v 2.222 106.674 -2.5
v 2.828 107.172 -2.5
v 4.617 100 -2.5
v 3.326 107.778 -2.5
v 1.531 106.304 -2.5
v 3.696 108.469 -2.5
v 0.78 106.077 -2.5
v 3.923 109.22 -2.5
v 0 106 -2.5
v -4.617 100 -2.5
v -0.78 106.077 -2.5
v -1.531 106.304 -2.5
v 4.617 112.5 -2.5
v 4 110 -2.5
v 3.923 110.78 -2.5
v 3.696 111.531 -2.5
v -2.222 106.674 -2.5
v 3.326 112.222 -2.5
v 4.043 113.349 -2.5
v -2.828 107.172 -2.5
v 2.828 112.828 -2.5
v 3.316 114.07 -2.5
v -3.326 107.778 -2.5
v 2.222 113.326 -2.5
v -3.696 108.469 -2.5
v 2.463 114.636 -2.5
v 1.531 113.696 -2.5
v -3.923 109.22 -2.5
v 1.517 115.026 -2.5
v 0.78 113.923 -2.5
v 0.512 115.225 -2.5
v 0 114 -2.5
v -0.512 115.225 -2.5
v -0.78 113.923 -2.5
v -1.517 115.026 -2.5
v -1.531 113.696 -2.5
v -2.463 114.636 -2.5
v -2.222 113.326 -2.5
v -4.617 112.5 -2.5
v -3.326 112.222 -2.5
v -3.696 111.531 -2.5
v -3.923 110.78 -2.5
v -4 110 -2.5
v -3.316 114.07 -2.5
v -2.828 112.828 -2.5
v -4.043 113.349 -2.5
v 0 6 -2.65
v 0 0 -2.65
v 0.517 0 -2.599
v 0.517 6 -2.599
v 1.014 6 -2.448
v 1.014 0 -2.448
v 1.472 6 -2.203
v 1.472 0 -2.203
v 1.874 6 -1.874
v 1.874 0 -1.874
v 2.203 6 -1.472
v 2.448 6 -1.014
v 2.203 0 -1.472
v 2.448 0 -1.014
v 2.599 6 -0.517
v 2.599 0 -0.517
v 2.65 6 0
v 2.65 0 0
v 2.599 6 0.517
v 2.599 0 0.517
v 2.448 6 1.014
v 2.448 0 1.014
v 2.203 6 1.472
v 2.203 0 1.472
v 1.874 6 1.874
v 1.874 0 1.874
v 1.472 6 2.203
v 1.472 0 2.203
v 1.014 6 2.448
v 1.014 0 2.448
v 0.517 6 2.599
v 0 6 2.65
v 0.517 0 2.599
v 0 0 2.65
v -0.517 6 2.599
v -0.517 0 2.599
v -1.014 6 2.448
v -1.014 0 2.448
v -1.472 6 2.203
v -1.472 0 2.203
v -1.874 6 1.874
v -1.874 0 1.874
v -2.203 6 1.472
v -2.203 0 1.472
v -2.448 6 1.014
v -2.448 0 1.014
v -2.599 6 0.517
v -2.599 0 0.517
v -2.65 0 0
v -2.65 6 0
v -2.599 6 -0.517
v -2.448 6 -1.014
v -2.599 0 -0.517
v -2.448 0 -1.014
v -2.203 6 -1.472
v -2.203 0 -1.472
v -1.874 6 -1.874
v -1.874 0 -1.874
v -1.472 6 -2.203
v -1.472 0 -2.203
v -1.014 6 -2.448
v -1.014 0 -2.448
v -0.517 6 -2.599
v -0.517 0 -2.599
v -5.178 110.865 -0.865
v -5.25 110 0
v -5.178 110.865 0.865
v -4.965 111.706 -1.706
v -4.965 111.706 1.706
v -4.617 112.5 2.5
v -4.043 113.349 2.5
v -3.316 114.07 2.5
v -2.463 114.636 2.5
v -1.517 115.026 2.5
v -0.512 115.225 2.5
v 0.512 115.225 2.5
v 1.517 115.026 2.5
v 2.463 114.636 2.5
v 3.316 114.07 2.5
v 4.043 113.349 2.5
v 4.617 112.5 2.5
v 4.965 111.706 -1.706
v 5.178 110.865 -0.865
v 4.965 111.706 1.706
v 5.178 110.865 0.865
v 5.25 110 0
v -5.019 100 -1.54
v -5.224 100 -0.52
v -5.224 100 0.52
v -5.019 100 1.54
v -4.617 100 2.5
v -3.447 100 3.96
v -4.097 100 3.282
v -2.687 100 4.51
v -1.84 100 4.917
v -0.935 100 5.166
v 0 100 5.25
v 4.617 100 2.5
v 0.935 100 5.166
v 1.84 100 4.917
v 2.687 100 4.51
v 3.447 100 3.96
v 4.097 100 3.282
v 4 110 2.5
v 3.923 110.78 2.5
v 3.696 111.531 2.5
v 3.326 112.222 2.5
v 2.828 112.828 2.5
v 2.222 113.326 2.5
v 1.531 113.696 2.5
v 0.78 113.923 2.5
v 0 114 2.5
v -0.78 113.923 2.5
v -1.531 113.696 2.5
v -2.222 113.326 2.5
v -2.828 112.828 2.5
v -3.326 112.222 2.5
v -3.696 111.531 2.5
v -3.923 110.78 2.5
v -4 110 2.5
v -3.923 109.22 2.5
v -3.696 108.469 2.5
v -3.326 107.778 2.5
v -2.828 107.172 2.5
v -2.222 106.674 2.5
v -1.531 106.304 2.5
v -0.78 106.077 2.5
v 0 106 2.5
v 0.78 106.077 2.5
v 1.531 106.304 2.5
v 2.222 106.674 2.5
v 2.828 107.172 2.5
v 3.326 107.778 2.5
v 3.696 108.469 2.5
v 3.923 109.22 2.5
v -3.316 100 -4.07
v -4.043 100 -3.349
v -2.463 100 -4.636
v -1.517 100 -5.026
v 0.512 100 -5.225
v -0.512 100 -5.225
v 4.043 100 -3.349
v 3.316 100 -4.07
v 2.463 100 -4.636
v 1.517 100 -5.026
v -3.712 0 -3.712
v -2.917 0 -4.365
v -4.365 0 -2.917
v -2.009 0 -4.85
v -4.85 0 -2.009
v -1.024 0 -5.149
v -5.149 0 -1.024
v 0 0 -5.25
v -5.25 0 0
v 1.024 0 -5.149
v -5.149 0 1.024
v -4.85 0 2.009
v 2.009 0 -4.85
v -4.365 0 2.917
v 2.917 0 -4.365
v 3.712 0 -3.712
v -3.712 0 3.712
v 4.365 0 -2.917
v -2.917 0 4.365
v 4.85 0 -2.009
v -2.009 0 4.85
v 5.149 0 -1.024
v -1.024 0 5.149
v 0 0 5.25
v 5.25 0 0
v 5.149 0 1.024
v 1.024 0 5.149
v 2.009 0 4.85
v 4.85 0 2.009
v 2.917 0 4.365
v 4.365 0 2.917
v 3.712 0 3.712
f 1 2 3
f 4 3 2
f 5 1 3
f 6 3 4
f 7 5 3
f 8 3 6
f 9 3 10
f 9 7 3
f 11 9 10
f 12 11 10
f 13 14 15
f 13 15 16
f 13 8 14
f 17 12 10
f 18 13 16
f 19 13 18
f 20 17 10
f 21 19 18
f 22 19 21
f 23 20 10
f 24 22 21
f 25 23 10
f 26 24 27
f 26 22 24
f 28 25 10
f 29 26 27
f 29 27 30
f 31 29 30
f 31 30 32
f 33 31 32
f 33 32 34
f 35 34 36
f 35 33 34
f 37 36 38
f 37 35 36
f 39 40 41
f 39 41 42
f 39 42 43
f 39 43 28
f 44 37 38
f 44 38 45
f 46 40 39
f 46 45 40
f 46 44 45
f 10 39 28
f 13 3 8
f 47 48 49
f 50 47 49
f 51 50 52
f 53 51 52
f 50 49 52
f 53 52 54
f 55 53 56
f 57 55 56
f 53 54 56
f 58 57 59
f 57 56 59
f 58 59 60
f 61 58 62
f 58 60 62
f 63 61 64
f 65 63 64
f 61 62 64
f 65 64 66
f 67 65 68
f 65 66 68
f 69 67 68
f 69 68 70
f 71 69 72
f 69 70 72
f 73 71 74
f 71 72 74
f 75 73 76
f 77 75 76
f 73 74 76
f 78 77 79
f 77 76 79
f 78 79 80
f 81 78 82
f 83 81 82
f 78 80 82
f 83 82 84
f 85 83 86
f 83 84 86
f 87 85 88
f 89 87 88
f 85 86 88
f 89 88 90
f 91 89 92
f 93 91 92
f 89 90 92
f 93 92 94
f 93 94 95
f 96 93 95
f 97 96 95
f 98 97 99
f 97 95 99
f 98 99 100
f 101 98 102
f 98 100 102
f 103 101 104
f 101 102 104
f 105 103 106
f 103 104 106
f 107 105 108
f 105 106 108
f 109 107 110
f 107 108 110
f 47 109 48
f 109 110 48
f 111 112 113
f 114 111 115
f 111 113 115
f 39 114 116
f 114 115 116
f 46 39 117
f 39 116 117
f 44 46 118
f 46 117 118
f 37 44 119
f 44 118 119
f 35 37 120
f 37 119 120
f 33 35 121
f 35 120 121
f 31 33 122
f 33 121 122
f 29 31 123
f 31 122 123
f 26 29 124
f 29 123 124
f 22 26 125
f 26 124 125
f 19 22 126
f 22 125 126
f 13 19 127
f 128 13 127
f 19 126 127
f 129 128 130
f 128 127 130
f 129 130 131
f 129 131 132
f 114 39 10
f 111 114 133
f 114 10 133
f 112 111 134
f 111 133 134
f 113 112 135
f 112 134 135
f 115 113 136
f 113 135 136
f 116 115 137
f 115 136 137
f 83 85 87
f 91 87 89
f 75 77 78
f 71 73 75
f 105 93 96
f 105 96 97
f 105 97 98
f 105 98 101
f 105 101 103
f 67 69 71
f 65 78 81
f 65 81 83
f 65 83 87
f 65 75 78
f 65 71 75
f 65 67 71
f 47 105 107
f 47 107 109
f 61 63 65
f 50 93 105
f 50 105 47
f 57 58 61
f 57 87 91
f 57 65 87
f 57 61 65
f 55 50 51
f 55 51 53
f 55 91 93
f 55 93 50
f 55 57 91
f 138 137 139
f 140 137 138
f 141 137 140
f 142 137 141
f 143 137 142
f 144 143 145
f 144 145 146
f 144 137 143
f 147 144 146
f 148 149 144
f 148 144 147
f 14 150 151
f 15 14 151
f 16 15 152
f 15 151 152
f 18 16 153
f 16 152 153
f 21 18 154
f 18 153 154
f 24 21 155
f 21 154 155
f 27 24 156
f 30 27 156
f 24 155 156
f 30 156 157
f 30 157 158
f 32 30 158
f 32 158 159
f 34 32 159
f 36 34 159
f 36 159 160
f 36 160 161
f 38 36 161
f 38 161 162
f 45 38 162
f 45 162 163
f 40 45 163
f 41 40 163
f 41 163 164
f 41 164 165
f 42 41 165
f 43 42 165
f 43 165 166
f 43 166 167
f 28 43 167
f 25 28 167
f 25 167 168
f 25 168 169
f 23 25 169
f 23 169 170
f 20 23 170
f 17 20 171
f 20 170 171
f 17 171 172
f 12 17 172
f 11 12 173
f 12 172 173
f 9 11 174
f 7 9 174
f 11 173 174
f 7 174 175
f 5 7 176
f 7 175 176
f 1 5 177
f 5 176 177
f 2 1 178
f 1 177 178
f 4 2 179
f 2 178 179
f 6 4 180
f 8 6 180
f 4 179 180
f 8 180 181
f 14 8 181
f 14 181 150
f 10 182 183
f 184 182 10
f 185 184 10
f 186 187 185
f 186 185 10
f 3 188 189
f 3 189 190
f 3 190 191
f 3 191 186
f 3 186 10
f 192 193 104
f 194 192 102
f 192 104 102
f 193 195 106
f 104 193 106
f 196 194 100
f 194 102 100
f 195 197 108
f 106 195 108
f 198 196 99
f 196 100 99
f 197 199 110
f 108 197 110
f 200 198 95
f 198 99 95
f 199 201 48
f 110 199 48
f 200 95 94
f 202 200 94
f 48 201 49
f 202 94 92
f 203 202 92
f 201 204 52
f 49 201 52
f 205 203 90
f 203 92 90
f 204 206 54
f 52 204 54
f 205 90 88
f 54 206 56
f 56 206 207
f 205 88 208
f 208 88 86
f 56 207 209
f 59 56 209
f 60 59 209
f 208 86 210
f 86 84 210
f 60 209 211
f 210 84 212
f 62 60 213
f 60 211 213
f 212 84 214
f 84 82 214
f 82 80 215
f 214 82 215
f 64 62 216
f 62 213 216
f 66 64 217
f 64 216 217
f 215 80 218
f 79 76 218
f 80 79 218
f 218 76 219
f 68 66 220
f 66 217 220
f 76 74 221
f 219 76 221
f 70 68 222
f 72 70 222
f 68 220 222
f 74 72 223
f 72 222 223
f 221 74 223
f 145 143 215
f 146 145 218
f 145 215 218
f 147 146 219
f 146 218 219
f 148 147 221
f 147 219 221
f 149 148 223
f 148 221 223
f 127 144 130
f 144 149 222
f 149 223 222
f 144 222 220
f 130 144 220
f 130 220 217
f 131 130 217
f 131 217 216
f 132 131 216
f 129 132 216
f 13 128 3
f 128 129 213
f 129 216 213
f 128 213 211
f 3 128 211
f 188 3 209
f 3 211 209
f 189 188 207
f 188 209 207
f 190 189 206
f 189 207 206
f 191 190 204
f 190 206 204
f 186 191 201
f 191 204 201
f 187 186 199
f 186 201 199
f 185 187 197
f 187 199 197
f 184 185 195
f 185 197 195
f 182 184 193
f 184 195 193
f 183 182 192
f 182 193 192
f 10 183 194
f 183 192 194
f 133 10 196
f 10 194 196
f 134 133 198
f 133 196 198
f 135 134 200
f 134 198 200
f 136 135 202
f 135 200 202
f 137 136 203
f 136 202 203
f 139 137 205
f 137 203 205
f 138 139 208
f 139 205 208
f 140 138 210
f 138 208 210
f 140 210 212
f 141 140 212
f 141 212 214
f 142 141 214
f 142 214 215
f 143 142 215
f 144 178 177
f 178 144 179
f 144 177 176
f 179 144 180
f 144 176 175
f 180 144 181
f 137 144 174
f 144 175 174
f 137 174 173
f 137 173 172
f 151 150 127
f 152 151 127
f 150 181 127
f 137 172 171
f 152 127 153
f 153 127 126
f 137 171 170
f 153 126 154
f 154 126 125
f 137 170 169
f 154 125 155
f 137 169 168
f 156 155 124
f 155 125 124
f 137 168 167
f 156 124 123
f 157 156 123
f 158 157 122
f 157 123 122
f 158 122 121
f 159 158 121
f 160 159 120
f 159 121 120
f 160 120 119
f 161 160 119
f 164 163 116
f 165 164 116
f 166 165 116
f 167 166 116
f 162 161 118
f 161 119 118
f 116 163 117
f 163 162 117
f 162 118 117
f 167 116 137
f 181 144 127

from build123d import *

# Parameters (mm, degrees)
SKETCH1_R           = 5.25
BOSS_EXTRUDE1_DEPTH = 100
BOSS_EXTRUDE2_DEPTH = 2.5
SKETCH3_OUTSIDE_W   = 35.74
SKETCH3_OUTSIDE_H   = 35.74
SKETCH3_OUTSIDE_R   = 5.25
CUT_EXTRUDE1_DEPTH  = 101.275246198
SKETCH4_R           = 4
CUT_EXTRUDE2_DEPTH  = 116.629526938
SKETCH5_R           = 2.65
CUT_EXTRUDE3_DEPTH  = 6


with BuildPart() as part:
    # Sketch1 → Boss-Extrude1 (new body)
    with BuildSketch(Plane(origin=(0, 0, 0), x_dir=(1, 0, 0), z_dir=(0, 1, 0))):
        with Locations(Location((0, 0, 0), (0, 0, 270))):
            Circle(SKETCH1_R)
    extrude(amount=BOSS_EXTRUDE1_DEPTH)

    # Sketch2 → Boss-Extrude2 (add, symmetric)
    with BuildSketch(Plane.XY):
        with BuildLine():
            Line((-5.25, 100), (-5.25, 110))
            ThreePointArc((-5.25, 110), (0, 115.25), (5.25, 110))
            Line((5.25, 110), (5.25, 100))
            Line((5.25, 100), (-5.25, 100))
        make_face()
    extrude(amount=BOSS_EXTRUDE2_DEPTH, both=True)

    # Sketch3 outside → Cut-Extrude1 (cut, through all)
    with BuildSketch(Plane(origin=(0, 100, 0), x_dir=(1, 0, 0), z_dir=(0, 1, 0))):
        Rectangle(SKETCH3_OUTSIDE_W, SKETCH3_OUTSIDE_H)
        with Locations(Location((0, 0, 0), (0, 0, 151.563109851))):
            Circle(SKETCH3_OUTSIDE_R, mode=Mode.SUBTRACT)
    extrude(amount=CUT_EXTRUDE1_DEPTH, mode=Mode.SUBTRACT)

    # Sketch4 → Cut-Extrude2 (cut, through all)
    with BuildSketch(Plane.XY.offset(2.5)):
        with Locations((0, 110)):
            Circle(SKETCH4_R)
    extrude(amount=-CUT_EXTRUDE2_DEPTH, mode=Mode.SUBTRACT)

    # Sketch5 → Cut-Extrude3 (cut)
    with BuildSketch(Plane.XZ):
        with Locations(Location((0, 0, 0), (0, 0, 270))):
            Circle(SKETCH5_R)
    extrude(amount=-CUT_EXTRUDE3_DEPTH, mode=Mode.SUBTRACT)


solid = part.part
